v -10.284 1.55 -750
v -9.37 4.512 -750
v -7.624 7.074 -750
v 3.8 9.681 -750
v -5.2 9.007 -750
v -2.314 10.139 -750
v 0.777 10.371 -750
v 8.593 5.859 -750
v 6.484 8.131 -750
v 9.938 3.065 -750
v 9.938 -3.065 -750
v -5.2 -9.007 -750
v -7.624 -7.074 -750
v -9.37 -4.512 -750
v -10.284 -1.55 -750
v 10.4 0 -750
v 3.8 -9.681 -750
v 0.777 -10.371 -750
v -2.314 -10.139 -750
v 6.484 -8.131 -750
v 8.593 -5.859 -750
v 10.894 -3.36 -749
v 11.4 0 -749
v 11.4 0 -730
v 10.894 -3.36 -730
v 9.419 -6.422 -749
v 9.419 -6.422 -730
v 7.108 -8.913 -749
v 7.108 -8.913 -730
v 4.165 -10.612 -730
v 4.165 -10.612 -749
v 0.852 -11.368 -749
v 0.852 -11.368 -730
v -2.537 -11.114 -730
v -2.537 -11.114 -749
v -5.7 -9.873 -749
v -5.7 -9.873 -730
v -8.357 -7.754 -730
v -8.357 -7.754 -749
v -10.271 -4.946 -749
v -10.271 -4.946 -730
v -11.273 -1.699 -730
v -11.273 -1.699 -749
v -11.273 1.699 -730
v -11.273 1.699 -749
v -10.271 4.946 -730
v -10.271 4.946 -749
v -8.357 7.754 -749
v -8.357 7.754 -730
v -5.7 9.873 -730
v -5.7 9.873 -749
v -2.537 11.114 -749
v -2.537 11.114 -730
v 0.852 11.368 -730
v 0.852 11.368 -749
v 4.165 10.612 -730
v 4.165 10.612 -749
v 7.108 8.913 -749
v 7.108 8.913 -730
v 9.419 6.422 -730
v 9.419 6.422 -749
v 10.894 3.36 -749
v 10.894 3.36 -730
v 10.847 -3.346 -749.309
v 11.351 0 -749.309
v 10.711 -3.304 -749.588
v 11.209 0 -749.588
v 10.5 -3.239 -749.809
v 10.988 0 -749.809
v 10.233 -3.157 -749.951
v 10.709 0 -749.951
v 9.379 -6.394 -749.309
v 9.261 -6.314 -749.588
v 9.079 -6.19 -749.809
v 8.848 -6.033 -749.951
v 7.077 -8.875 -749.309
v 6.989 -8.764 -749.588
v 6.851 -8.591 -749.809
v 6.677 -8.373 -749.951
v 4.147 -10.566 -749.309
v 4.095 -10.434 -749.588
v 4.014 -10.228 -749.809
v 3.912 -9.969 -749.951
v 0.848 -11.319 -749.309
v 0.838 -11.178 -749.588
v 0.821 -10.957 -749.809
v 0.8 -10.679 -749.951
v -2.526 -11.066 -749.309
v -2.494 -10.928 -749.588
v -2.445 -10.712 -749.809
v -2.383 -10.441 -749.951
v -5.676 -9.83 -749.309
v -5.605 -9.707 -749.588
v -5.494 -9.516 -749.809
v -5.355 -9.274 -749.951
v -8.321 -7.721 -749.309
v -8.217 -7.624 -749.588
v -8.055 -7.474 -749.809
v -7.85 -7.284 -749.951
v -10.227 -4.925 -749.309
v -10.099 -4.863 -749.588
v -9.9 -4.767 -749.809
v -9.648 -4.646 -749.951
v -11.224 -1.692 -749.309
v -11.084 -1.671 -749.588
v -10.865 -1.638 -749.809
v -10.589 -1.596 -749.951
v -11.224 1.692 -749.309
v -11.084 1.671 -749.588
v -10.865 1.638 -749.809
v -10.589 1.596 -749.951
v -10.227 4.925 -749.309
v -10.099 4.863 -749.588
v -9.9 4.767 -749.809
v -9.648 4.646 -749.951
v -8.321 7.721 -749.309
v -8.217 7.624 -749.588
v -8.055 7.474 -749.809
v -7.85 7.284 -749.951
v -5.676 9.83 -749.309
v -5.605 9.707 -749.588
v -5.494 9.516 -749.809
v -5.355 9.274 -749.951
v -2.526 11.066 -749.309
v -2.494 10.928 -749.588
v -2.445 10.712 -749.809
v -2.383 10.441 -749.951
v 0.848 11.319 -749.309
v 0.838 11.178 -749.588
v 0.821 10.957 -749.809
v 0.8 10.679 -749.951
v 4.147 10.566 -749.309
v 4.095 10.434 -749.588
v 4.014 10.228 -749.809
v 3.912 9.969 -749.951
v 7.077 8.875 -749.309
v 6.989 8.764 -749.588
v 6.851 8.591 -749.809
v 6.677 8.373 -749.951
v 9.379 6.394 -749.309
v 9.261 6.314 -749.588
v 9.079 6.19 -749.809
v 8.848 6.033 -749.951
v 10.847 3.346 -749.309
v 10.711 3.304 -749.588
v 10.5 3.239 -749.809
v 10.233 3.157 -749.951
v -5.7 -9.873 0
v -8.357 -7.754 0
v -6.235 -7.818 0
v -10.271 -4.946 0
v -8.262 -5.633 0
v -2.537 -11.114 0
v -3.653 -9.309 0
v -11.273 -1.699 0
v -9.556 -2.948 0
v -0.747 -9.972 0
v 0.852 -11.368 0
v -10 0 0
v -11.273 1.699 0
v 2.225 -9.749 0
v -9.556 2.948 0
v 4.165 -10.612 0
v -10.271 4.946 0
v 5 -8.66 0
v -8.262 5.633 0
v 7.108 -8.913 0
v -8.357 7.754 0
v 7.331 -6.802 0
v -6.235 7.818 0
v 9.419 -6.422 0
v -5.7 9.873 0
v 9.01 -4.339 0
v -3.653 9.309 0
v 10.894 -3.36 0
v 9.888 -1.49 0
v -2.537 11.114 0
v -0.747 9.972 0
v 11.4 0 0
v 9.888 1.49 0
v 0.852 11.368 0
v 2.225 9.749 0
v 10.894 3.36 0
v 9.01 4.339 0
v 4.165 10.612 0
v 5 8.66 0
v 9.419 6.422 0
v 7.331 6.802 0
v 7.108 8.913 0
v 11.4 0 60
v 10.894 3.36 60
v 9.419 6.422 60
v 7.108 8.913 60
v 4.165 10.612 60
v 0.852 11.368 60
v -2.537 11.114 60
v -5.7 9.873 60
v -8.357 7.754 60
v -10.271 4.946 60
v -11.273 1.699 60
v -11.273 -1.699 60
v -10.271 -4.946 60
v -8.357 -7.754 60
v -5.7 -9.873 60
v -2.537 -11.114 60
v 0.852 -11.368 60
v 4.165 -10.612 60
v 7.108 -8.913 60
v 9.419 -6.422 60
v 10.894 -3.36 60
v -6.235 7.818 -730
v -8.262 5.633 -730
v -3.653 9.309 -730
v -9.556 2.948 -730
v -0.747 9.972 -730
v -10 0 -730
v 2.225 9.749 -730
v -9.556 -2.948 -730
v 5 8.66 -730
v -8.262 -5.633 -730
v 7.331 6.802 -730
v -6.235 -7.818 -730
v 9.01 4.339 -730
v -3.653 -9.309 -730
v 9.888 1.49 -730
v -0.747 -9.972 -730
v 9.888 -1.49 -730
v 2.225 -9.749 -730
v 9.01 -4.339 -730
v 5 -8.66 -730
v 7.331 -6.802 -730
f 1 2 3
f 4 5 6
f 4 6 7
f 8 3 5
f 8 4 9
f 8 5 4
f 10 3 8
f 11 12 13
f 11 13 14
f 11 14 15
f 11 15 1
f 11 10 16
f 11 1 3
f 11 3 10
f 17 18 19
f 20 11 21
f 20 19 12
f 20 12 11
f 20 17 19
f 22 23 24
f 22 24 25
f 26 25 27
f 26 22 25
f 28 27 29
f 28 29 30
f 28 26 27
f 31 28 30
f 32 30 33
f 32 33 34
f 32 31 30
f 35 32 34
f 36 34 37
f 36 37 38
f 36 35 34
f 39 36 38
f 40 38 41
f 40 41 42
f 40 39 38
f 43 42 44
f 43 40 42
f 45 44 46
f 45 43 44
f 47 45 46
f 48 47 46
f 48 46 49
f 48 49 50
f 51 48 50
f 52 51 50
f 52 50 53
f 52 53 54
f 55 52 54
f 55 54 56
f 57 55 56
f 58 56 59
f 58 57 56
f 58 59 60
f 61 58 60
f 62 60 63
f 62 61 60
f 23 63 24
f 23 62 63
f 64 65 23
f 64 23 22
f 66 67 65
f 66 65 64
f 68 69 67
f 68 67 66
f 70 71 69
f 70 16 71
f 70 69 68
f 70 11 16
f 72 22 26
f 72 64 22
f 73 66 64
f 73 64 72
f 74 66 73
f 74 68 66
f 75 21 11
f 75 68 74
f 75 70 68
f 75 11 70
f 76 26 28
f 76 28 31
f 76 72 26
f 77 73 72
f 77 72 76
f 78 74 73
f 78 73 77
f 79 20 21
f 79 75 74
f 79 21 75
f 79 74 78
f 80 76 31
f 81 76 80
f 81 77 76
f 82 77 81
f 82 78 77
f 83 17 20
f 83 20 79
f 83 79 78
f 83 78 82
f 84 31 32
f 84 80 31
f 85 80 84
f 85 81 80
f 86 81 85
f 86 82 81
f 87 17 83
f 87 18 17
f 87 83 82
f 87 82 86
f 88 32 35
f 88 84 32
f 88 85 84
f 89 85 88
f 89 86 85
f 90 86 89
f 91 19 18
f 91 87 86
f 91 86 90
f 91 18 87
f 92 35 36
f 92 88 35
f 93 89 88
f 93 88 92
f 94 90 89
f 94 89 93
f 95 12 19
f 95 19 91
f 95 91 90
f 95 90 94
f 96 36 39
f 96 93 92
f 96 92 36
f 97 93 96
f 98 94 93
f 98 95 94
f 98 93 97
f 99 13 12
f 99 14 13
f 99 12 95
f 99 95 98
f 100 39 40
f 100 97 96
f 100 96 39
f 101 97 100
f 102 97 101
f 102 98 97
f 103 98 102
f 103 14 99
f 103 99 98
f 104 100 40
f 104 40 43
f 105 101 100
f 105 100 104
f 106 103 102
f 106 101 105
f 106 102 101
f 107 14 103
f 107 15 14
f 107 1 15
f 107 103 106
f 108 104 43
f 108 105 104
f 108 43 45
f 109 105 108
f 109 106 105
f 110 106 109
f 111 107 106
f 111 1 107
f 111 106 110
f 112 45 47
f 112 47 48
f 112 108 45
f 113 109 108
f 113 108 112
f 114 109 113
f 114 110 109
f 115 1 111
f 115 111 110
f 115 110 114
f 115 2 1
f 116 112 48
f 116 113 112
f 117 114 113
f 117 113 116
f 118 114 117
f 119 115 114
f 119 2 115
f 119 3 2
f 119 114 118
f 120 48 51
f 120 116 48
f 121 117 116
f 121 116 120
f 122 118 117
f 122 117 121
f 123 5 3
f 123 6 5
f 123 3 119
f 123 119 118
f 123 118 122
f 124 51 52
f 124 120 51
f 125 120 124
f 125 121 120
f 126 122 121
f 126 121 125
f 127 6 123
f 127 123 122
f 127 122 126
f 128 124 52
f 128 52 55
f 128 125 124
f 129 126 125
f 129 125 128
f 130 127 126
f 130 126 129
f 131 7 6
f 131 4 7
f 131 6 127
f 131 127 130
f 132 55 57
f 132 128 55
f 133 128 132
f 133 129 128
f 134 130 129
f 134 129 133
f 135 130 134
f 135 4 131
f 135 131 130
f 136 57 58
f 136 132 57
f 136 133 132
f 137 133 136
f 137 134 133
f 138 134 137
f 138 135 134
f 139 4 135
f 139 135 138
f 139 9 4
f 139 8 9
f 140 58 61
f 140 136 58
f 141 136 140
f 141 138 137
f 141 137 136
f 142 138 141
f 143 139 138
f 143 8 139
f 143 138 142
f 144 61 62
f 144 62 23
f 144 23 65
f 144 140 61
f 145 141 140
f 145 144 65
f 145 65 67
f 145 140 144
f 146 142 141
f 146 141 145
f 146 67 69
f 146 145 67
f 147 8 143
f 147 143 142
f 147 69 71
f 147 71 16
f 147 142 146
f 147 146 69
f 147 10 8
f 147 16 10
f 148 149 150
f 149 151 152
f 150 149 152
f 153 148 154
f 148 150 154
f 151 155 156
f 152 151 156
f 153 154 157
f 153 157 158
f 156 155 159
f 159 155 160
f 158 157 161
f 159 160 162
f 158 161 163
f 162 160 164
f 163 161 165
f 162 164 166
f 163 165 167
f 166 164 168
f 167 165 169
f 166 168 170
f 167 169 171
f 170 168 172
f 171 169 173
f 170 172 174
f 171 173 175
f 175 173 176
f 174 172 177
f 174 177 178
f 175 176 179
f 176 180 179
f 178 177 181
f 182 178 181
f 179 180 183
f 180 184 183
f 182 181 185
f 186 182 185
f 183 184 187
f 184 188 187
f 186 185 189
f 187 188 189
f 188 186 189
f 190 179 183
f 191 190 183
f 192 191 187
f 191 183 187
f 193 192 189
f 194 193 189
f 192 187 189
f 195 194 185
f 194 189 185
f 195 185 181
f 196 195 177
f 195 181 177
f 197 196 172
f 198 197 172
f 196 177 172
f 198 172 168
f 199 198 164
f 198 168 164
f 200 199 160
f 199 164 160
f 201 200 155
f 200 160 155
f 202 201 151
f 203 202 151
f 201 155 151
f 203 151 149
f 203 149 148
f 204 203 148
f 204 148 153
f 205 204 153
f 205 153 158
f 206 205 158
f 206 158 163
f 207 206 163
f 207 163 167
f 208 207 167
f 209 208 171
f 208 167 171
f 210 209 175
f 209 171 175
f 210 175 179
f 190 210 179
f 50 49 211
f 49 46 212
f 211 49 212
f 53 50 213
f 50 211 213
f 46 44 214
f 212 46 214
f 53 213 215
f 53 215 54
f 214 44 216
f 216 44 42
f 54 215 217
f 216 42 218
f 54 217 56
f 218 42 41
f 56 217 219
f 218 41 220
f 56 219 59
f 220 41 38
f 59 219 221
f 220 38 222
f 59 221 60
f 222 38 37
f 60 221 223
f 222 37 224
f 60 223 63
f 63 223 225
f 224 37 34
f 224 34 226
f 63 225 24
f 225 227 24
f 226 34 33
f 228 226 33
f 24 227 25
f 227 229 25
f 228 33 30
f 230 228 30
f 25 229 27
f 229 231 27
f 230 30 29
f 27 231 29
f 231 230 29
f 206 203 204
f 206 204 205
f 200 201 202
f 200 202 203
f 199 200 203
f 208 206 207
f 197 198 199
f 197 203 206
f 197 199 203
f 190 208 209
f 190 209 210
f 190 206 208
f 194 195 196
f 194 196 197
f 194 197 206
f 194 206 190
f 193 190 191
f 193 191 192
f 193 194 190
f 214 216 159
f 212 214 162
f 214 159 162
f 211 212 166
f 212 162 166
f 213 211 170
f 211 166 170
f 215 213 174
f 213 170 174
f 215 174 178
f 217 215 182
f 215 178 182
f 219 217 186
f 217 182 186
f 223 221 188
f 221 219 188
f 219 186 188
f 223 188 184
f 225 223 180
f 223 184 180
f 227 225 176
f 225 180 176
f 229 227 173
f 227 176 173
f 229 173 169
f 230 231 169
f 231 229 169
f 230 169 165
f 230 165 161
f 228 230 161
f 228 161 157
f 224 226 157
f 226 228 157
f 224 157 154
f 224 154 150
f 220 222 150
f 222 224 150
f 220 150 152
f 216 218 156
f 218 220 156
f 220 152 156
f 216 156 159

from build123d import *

# Parameters (mm, degrees)
ESQUISSE1_R        = 11.4
BOSS_EXTRU_1_DEPTH = 60
ESQUISSE2_R        = 10
BOSS_EXTRU_2_DEPTH = 750
ESQUISSE3_R        = 11.4
BOSS_EXTRU_3_DEPTH = 20
CONG_1_R           = 1


with BuildPart() as part:
    # Esquisse1 → Boss.-Extru.1 (new body)
    with BuildSketch(Plane.XY):
        Circle(ESQUISSE1_R)
    extrude(amount=BOSS_EXTRU_1_DEPTH)

    # Esquisse2 → Boss.-Extru.2 (add)
    with BuildSketch(Plane(origin=(0, 0, 0), x_dir=(-1, 0, 0), z_dir=(0, 0, -1))):
        Circle(ESQUISSE2_R)
    extrude(amount=BOSS_EXTRU_2_DEPTH)

    # Esquisse3 → Boss.-Extru.3 (add)
    with BuildSketch(Plane(origin=(0, 0, -750), x_dir=(-1, 0, 0), z_dir=(0, 0, -1))):
        with Locations(Location((0, 0, 0), (0, 0, 180))):
            Circle(ESQUISSE3_R)
    extrude(amount=-BOSS_EXTRU_3_DEPTH)

    # Congé1
    cong_1_edges = [part.edges().sort_by_distance(p)[0] for p in [
        (-11.4, 0, -750),
    ]]
    fillet(cong_1_edges, radius=CONG_1_R)


solid = part.part
